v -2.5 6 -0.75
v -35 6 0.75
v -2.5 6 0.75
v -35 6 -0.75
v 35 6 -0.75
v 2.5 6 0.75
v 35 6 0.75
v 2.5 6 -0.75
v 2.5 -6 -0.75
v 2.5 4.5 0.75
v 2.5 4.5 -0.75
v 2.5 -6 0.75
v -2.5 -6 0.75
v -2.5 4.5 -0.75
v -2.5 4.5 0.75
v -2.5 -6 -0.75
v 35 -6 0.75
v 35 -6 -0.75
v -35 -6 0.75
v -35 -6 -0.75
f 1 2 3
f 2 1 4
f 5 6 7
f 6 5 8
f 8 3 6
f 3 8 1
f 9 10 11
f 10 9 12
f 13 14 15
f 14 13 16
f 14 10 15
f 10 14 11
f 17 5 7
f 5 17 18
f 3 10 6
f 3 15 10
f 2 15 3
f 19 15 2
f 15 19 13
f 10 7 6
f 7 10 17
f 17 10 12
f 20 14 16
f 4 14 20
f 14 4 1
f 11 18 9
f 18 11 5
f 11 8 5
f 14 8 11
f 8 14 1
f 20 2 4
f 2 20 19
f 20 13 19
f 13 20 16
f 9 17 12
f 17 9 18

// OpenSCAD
// Dimensions
spine_length = 70;     // Length of the spine (X direction)
spine_width = 12;    // Width of the spine (Y direction)
spine_thickness = 1.5; // Thickness of the comb (Z direction)
tooth_width = 5.0;   // Width of each tooth (X direction)
tooth_length = 12;   // Length of each tooth (Y direction)
tooth_gap = 1.5;     // Gap between teeth (Y direction)
num_teeth = 10;      // Number of teeth

// Main comb plate
difference() {
  // Base plate
  cube([spine_length, spine_width, spine_thickness], center=true);
  
  // Teeth
  for (i = [0:num_teeth-1]) {
    translate([0, (spine_width/2 + tooth_length/2) - i*(tooth_length + tooth_gap), 0])
    cube([tooth_width, tooth_length, spine_thickness + 0.01], center=true);
  }
}
